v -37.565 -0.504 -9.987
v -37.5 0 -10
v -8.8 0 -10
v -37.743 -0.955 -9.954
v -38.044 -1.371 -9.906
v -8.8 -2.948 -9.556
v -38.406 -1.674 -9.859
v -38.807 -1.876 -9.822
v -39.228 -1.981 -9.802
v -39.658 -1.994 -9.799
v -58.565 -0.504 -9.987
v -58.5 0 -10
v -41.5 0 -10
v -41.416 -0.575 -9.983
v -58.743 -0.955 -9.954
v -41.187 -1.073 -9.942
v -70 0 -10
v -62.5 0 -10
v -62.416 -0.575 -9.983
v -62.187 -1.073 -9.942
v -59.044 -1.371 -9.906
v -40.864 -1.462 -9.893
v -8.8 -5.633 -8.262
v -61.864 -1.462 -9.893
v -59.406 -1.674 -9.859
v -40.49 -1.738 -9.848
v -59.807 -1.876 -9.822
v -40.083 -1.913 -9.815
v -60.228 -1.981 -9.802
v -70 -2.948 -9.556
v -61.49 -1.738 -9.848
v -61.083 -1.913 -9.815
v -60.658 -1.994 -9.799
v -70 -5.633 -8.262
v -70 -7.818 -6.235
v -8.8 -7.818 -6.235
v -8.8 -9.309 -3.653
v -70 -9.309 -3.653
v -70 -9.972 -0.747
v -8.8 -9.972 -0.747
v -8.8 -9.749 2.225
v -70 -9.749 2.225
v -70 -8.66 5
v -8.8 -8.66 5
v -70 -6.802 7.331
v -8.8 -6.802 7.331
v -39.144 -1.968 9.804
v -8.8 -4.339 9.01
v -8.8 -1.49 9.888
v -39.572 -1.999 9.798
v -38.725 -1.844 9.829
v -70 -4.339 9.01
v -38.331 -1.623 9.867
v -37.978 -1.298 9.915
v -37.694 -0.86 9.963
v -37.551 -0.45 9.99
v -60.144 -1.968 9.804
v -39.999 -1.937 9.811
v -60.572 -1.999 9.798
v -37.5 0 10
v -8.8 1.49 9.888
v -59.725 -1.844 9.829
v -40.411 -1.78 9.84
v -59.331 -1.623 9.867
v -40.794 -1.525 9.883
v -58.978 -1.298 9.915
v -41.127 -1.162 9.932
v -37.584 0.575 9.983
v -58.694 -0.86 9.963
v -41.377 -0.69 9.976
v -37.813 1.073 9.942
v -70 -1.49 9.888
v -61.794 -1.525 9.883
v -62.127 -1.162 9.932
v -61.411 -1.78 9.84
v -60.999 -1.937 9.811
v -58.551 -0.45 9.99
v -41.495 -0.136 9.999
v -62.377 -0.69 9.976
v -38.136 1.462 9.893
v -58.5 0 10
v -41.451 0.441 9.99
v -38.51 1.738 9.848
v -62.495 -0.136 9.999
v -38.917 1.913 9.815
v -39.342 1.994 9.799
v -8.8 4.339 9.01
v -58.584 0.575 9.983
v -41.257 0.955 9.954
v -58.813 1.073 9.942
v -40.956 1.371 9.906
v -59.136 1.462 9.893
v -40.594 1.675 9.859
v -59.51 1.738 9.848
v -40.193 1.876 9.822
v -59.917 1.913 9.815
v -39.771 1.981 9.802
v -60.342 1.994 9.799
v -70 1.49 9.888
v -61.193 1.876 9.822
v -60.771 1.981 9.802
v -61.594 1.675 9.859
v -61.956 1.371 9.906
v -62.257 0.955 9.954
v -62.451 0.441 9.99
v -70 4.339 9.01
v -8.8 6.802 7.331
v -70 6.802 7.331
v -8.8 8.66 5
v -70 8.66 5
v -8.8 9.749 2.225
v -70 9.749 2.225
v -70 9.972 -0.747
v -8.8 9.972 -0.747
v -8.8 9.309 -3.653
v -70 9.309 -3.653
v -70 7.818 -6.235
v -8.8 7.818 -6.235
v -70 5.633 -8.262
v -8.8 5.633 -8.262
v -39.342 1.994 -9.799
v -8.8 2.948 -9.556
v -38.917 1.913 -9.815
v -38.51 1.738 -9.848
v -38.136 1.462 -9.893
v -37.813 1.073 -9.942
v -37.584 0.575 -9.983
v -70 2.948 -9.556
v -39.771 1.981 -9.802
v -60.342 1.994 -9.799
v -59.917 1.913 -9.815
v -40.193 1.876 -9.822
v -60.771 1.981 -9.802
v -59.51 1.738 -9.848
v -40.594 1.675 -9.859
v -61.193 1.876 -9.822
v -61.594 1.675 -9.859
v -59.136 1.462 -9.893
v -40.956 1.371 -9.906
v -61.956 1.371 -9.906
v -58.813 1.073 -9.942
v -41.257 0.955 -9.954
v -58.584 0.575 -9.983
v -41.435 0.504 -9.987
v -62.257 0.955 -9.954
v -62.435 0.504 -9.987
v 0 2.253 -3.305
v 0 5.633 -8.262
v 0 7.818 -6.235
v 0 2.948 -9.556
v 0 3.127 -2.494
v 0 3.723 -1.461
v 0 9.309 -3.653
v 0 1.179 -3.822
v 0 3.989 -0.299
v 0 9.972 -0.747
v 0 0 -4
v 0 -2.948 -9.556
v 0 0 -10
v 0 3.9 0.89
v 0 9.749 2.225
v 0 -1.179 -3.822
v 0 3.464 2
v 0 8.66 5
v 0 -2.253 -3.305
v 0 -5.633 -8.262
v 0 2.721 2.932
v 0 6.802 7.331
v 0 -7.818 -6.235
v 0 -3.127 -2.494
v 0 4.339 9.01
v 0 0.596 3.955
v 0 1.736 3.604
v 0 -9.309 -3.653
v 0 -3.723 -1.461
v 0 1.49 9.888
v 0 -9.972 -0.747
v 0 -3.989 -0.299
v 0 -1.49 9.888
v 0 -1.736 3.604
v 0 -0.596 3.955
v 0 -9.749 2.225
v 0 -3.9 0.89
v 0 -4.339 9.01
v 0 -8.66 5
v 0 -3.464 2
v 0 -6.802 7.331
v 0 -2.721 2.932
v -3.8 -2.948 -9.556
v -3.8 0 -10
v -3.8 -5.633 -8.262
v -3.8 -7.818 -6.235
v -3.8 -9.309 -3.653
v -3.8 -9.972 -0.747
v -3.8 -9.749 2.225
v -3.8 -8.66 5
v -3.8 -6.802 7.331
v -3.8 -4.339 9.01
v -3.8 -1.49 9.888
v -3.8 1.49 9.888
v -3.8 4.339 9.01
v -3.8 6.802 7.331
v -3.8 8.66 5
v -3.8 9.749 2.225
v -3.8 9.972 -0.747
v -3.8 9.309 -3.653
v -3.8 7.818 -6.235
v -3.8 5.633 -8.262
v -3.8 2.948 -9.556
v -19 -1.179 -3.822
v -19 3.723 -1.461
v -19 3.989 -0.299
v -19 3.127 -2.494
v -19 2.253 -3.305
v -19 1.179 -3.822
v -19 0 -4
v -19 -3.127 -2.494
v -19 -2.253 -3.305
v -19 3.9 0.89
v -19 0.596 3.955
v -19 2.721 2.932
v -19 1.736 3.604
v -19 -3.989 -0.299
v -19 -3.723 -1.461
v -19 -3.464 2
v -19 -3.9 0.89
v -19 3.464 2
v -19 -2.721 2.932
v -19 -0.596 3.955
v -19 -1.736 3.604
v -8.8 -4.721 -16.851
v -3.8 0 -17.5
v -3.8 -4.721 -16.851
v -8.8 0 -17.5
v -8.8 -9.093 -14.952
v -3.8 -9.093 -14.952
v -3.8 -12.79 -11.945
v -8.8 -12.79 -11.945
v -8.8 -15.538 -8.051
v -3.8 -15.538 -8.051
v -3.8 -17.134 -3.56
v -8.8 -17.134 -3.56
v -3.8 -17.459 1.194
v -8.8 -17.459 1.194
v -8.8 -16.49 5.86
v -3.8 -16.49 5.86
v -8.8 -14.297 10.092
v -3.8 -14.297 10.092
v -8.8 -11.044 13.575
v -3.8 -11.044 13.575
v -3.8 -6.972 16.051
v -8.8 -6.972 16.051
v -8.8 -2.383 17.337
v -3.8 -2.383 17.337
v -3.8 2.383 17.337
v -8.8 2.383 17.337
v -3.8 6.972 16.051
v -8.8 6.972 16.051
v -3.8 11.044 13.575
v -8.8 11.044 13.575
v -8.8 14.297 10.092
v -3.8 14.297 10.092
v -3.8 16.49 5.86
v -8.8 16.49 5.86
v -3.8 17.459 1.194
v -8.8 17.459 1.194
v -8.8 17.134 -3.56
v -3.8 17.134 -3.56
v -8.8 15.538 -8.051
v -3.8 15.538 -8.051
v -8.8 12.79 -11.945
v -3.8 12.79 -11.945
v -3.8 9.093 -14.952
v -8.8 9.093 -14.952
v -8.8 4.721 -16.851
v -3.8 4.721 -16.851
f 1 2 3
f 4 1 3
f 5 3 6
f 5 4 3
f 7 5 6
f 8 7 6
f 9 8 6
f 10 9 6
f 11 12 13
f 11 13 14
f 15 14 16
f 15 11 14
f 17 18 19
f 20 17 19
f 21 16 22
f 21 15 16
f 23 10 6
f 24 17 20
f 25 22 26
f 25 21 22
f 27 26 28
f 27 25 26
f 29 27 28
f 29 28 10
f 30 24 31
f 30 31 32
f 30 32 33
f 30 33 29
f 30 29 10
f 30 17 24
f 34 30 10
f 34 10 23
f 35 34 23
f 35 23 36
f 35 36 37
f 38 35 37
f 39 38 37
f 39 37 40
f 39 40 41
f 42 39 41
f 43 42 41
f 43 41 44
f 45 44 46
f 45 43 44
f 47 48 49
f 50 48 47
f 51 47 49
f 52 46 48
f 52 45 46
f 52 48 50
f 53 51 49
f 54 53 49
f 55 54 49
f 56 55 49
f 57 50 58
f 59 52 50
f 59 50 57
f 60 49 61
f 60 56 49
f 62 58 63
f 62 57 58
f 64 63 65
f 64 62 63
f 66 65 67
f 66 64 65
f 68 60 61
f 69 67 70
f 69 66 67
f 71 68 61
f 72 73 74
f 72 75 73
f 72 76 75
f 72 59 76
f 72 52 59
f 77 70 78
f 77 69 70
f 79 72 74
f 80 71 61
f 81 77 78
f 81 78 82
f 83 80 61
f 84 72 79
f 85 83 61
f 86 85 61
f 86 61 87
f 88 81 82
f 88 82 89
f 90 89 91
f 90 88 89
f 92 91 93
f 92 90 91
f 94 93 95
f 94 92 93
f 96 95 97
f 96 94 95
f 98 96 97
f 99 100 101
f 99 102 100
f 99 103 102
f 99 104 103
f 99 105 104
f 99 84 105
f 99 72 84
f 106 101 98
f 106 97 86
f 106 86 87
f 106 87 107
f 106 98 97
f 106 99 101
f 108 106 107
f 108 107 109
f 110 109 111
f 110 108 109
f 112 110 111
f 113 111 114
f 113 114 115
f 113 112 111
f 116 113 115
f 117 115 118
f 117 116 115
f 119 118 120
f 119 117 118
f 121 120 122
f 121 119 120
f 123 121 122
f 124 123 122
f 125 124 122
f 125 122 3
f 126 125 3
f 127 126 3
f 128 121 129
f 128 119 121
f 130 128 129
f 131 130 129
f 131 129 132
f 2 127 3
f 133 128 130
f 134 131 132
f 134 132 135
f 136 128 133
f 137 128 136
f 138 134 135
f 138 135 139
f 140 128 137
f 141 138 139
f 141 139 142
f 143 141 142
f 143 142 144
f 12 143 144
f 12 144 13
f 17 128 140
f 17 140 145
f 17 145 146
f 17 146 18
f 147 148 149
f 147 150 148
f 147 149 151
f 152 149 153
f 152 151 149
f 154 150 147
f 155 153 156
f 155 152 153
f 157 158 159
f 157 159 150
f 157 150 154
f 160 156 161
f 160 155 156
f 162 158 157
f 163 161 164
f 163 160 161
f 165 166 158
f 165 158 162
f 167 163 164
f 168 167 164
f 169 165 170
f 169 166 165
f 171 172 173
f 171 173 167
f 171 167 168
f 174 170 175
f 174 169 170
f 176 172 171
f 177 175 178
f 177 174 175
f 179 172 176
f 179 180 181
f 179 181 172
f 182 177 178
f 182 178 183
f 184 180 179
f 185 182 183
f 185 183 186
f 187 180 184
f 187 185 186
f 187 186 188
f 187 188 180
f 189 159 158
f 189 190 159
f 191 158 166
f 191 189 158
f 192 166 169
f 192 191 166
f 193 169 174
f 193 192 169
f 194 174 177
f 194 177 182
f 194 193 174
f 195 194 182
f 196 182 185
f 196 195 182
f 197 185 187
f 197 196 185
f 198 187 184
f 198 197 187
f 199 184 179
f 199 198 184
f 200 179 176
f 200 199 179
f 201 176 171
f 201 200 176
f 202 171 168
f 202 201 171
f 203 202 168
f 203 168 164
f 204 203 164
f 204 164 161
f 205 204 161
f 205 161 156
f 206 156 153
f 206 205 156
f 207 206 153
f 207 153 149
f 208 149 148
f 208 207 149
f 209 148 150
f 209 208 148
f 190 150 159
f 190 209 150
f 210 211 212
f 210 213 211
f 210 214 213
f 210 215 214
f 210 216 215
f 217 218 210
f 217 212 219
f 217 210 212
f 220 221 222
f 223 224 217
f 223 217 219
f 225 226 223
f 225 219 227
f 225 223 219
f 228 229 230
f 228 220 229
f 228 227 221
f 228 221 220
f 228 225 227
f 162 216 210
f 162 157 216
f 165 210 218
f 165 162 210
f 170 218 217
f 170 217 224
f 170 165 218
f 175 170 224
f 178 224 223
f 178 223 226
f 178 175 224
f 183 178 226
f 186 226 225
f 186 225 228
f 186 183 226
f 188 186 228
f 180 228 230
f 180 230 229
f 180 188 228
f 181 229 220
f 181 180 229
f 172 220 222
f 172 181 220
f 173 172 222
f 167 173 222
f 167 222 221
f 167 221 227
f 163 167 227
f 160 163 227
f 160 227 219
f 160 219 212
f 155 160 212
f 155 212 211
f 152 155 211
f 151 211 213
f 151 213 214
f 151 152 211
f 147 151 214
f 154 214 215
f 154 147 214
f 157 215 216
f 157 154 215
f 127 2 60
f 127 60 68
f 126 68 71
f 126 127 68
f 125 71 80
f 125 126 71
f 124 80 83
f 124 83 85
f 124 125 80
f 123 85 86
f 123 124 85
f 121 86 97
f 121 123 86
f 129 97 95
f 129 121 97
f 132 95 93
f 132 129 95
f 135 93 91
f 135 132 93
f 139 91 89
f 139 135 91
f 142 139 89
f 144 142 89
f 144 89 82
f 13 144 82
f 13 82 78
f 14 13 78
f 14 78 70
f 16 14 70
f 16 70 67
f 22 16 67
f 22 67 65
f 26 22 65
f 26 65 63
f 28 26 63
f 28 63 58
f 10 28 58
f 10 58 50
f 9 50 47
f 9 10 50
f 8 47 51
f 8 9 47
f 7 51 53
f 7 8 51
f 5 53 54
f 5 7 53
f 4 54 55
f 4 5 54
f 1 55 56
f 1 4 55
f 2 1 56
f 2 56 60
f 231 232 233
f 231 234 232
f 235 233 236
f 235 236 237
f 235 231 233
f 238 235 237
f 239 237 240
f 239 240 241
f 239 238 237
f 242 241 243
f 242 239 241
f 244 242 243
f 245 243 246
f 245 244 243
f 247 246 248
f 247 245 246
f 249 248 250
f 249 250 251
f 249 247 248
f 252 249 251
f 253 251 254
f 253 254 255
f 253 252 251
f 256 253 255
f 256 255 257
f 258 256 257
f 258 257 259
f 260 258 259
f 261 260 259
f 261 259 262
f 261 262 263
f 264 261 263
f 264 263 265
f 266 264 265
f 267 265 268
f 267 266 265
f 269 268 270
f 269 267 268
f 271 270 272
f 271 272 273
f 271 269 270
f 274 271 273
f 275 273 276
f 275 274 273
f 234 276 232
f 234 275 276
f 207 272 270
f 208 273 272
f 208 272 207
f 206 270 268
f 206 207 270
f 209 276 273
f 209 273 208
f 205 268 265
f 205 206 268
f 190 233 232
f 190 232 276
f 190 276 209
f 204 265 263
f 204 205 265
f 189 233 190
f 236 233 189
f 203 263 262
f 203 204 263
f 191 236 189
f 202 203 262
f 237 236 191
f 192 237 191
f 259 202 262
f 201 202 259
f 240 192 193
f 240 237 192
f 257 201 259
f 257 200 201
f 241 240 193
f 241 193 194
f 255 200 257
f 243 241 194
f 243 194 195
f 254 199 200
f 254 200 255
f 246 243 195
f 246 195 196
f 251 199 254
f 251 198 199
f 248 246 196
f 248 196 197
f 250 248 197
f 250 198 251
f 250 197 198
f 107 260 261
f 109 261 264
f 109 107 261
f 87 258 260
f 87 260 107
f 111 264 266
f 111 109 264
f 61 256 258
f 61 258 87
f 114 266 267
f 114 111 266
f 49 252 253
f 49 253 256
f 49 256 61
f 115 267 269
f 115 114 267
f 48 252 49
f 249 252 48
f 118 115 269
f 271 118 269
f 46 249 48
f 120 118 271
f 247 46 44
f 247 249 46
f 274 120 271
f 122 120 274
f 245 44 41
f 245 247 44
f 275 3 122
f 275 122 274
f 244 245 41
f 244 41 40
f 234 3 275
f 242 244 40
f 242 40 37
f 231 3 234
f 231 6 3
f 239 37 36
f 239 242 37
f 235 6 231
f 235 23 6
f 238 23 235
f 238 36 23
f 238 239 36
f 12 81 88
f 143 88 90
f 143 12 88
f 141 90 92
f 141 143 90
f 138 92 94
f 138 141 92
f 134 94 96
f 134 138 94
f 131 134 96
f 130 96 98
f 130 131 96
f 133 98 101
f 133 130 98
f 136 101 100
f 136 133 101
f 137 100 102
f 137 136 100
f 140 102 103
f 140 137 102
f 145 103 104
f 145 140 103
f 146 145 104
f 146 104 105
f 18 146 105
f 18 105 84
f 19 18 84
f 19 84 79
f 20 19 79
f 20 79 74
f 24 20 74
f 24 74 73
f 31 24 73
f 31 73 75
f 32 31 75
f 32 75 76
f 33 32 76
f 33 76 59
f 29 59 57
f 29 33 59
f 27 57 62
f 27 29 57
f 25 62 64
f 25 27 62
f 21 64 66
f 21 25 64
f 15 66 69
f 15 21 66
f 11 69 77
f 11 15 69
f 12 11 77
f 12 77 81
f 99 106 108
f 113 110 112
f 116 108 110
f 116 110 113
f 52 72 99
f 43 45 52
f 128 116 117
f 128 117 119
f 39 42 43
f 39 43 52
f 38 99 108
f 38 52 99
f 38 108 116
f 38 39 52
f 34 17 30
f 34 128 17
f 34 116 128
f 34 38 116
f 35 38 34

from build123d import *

# Parameters (mm, degrees)
CUT_EXTRUDE2_DEPTH      = 75.246212025
CUT_EXTRUDE2_DEPTH_BACK = 75.246212025
SKETCH5_R               = 2


with BuildPart() as part:
    # Sketch1 → Revolve2 (revolve)
    with BuildSketch(Plane(origin=(0, 0, 0), x_dir=(1, 0, 0), z_dir=(0, 1, 0))):
        Polygon((-3.8, 10), (-3.8, 17.5), (-8.8, 17.5), (-8.8, 10), (-70, 10), (-70, 0), (-19, 0), (-19, 4), (0, 4), (0, 10), align=None)
    revolve(axis=Axis((0, 0, 0), (-1, 0, 0)))

    # Sketch5 → Cut-Extrude2 (cut, two sides: drawn at the far end of the back side and taken through both)
    with BuildSketch(Plane.XY.offset(-CUT_EXTRUDE2_DEPTH_BACK)):
        with Locations((-39.5, 0)):
            Circle(SKETCH5_R)
        with Locations((-60.5, 0)):
            Circle(SKETCH5_R)
    extrude(amount=CUT_EXTRUDE2_DEPTH + CUT_EXTRUDE2_DEPTH_BACK, mode=Mode.SUBTRACT)


solid = part.part
